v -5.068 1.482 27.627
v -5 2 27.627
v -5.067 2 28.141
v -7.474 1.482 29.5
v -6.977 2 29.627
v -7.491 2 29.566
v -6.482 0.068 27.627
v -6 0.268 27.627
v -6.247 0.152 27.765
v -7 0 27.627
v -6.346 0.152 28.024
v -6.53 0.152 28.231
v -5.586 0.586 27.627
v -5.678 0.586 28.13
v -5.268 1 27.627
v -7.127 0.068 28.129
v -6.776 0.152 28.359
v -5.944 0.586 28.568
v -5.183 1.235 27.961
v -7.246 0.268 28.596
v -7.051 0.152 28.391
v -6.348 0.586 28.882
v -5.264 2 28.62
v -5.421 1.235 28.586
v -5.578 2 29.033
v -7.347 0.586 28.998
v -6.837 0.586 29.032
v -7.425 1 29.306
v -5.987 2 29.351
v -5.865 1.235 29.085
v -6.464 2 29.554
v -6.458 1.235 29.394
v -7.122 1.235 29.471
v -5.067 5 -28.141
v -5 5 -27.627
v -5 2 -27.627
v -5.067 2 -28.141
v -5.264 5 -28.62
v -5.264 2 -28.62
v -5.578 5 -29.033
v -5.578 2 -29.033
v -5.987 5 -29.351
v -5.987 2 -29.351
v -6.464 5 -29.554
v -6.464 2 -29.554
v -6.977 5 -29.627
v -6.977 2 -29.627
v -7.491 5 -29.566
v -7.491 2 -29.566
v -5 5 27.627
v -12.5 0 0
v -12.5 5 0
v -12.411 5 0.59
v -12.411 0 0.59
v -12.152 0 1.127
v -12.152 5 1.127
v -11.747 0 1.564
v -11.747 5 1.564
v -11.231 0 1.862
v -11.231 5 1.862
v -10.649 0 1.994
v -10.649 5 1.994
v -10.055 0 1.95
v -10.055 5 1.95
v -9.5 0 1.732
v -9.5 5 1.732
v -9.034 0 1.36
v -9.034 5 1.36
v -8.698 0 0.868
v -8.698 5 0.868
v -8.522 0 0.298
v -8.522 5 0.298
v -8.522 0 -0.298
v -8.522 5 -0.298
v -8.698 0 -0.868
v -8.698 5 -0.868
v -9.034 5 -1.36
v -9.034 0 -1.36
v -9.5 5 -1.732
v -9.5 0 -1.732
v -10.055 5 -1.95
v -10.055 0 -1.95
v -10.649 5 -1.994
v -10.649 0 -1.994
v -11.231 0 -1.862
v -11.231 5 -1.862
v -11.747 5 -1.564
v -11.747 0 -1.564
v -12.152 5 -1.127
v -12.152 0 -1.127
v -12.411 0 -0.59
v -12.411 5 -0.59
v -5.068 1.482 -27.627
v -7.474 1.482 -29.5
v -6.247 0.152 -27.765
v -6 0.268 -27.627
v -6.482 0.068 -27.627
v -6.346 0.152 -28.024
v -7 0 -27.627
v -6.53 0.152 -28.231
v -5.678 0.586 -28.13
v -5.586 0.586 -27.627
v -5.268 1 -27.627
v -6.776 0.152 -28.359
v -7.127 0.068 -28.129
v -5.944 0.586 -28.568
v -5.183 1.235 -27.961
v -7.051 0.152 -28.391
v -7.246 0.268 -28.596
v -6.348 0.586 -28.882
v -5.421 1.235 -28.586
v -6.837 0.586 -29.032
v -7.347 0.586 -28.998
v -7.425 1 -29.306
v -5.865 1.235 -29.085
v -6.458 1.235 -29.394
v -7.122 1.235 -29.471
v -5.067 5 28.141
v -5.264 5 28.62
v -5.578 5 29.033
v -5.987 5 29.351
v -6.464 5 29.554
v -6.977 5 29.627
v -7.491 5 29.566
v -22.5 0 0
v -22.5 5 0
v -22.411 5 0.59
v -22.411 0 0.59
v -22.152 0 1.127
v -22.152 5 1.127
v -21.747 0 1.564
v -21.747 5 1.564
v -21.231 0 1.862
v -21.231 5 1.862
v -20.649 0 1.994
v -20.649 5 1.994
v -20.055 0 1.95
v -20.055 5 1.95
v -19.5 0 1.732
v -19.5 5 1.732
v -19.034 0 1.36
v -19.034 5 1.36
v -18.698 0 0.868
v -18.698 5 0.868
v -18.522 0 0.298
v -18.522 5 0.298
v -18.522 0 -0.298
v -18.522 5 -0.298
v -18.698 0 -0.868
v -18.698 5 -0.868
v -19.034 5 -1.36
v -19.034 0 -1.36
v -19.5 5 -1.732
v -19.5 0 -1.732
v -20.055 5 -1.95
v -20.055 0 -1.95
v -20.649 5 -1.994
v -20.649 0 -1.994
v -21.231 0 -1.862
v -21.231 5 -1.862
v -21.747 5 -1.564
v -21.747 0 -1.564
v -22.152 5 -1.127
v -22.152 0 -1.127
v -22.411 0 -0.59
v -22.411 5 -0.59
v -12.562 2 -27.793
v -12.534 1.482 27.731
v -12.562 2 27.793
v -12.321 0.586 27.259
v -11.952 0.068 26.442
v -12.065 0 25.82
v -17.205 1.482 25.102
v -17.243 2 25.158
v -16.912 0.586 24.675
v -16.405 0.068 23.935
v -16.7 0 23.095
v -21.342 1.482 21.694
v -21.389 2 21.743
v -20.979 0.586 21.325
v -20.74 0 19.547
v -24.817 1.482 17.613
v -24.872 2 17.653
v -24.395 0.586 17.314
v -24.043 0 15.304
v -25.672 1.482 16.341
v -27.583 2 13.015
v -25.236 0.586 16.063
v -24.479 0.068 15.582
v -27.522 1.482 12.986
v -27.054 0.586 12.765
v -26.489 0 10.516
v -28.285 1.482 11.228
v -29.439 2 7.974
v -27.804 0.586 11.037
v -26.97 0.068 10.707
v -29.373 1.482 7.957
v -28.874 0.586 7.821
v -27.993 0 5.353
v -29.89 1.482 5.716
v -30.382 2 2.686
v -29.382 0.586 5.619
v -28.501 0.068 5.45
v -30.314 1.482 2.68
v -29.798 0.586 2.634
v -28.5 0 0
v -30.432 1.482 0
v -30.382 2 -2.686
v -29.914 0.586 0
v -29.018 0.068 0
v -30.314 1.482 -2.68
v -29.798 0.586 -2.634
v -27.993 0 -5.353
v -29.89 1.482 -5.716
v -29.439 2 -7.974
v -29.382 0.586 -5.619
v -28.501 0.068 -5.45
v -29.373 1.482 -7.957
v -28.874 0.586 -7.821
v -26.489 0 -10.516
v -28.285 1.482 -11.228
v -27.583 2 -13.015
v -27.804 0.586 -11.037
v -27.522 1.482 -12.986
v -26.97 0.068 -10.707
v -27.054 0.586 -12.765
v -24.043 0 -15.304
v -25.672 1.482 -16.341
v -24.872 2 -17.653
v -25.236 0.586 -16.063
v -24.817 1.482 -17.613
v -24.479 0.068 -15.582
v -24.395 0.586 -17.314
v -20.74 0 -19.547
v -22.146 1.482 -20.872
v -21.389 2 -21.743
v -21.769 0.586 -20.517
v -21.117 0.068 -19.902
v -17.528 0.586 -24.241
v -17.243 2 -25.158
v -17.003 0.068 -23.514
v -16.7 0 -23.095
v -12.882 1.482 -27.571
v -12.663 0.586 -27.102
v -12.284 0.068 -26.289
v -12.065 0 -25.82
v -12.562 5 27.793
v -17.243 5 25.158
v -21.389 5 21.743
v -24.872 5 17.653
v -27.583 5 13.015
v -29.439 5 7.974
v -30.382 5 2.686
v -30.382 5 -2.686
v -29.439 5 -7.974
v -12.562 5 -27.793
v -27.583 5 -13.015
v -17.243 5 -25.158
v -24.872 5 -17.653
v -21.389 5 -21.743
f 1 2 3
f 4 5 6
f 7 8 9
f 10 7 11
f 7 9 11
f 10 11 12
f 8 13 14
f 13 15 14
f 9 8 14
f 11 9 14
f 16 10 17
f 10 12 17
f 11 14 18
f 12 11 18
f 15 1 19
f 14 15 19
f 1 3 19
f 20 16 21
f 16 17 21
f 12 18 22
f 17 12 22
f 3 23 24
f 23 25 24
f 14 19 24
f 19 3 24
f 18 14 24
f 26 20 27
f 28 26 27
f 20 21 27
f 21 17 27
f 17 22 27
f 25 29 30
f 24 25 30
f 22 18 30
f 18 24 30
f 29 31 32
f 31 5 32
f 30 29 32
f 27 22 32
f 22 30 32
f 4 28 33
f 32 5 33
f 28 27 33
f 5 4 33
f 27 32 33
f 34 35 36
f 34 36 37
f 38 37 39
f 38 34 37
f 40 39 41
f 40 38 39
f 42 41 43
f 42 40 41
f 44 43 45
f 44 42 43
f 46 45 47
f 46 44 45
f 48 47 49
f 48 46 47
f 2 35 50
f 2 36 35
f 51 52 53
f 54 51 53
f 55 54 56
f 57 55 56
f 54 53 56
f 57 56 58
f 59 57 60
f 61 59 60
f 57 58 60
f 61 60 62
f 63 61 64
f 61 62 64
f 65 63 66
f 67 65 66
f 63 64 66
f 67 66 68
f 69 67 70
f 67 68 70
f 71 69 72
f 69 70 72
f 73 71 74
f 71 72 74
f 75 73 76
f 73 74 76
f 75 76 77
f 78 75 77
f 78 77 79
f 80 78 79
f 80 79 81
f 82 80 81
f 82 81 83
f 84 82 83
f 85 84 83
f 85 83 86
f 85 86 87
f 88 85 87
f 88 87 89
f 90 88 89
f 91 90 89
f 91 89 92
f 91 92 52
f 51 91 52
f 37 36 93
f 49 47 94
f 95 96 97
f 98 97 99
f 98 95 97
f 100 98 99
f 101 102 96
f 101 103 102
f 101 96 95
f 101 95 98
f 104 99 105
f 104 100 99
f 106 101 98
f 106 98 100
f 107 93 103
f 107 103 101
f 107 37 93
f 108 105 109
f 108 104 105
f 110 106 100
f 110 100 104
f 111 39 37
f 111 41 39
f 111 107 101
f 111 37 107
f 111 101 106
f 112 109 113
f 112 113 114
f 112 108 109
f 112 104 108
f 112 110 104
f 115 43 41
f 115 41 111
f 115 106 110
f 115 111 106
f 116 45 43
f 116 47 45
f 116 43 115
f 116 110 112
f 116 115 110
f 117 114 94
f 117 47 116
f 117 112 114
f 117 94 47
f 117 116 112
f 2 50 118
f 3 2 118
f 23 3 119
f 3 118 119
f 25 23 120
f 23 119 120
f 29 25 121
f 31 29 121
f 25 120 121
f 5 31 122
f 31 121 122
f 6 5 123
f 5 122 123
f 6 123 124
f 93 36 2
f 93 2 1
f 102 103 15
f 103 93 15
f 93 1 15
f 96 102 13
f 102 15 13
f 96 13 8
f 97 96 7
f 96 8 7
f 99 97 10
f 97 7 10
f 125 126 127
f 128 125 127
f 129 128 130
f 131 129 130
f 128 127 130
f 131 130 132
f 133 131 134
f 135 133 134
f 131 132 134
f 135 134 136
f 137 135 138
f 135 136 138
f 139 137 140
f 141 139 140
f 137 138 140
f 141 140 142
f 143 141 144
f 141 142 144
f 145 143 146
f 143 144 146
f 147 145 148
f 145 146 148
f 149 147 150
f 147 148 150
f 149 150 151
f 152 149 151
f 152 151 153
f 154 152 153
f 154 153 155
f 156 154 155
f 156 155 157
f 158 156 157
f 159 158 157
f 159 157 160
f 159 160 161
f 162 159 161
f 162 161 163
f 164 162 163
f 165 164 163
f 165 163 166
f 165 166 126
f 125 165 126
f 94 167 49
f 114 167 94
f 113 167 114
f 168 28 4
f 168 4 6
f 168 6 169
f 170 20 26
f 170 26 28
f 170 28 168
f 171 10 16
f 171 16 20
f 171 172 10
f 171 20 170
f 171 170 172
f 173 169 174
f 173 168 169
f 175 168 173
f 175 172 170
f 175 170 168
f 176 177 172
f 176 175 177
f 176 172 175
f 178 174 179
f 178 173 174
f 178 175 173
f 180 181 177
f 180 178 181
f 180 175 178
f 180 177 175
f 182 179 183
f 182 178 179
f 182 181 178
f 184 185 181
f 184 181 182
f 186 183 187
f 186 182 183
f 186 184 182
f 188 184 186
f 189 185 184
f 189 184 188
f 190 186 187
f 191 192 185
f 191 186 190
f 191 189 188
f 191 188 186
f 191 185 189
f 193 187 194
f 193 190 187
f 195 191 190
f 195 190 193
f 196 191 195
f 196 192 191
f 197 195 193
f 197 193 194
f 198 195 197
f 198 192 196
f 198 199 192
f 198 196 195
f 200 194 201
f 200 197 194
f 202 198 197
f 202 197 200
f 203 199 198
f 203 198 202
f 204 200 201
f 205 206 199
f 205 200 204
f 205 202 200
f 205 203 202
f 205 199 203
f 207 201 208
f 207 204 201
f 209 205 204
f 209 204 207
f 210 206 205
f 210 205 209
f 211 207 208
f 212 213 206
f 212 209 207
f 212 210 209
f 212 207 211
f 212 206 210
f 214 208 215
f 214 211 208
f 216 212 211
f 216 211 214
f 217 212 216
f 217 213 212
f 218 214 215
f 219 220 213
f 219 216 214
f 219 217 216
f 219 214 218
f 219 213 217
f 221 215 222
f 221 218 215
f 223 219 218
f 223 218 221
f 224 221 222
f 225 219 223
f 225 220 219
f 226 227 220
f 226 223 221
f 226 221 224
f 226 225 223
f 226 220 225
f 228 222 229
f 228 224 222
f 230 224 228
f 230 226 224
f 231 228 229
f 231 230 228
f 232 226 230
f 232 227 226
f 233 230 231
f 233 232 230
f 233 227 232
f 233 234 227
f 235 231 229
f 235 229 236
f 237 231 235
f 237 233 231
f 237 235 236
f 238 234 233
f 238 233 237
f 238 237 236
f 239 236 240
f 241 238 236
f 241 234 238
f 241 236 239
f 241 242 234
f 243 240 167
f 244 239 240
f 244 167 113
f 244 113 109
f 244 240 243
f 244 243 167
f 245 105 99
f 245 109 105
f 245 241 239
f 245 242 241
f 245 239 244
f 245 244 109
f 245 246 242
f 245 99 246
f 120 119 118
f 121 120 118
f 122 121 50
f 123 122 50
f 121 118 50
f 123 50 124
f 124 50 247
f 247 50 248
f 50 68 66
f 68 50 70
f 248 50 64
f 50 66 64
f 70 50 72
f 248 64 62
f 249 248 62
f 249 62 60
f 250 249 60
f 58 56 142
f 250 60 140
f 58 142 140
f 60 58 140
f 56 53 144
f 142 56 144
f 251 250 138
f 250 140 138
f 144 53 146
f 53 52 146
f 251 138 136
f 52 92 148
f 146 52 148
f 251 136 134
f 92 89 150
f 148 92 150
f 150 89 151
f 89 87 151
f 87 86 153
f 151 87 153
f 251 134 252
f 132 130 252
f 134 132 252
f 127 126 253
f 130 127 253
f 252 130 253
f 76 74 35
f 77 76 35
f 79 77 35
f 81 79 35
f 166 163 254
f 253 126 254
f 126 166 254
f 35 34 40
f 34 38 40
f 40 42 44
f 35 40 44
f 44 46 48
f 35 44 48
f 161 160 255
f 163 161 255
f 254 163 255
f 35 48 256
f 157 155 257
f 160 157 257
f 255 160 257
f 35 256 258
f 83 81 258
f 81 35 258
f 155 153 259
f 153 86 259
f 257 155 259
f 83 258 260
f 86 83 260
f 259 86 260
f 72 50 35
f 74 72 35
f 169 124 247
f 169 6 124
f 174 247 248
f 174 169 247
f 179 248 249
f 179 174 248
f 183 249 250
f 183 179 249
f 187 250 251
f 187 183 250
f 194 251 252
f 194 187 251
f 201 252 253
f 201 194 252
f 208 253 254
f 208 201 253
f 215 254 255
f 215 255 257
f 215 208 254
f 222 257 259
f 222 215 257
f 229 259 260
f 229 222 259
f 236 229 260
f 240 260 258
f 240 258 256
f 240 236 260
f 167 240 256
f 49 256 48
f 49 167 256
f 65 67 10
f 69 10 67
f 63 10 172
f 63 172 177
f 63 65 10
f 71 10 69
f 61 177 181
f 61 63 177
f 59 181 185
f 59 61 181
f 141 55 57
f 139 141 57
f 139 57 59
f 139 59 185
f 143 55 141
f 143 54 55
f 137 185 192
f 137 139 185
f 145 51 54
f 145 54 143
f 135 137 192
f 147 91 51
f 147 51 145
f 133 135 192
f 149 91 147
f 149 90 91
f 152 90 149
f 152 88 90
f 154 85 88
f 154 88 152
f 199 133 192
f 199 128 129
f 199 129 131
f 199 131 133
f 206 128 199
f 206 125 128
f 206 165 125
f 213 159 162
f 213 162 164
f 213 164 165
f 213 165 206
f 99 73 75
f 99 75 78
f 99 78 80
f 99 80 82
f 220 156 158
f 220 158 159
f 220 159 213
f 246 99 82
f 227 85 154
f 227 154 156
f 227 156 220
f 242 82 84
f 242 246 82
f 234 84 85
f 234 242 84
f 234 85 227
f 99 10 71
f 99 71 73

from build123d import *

# Parameters (mm, degrees)
BOSS_EXTRUDE2_DEPTH       = 5
F_4_0MM_DOWEL_HOLE1_D     = 4
F_4_0MM_DOWEL_HOLE1_DEPTH = 117.6291
F_4_0MM_DOWEL_HOLE1_TIP   = 1.201721238
FILLET1_R                 = 2


with BuildPart() as part:
    # Sketch2 → Boss-Extrude2 (new body)
    with BuildSketch(Plane(origin=(0, 0, 0), x_dir=(1, 0, 0), z_dir=(0, 1, 0))):
        with BuildLine():
            Line((-5, 30.087372767), (-5, -30.087372767))
            ThreePointArc((-5, -30.087372767), (-30.5, 0), (-5, 30.087372767))
        make_face()
    extrude(amount=BOSS_EXTRUDE2_DEPTH)

    # Ø4.0mm Dowel Hole1
    with Locations(Plane.XZ):
        with Locations((-20.5, 0), (-10.5, 0)):
            Hole(F_4_0MM_DOWEL_HOLE1_D / 2, depth=F_4_0MM_DOWEL_HOLE1_DEPTH)
            with Locations((0, 0, -(F_4_0MM_DOWEL_HOLE1_DEPTH + F_4_0MM_DOWEL_HOLE1_TIP / 2))):  # 118° drill point
                Cone(0, F_4_0MM_DOWEL_HOLE1_D / 2, F_4_0MM_DOWEL_HOLE1_TIP, mode=Mode.SUBTRACT)

    # Fillet1
    fillet1_edges = [part.edges().sort_by_distance(p)[0] for p in [
        (-5, 0, 0),
        (-30.5, 0, 0),
        (-5, 2.5, -30.087372767),
        (-5, 2.5, 30.087372767),
    ]]
    fillet(fillet1_edges, radius=FILLET1_R)


solid = part.part
